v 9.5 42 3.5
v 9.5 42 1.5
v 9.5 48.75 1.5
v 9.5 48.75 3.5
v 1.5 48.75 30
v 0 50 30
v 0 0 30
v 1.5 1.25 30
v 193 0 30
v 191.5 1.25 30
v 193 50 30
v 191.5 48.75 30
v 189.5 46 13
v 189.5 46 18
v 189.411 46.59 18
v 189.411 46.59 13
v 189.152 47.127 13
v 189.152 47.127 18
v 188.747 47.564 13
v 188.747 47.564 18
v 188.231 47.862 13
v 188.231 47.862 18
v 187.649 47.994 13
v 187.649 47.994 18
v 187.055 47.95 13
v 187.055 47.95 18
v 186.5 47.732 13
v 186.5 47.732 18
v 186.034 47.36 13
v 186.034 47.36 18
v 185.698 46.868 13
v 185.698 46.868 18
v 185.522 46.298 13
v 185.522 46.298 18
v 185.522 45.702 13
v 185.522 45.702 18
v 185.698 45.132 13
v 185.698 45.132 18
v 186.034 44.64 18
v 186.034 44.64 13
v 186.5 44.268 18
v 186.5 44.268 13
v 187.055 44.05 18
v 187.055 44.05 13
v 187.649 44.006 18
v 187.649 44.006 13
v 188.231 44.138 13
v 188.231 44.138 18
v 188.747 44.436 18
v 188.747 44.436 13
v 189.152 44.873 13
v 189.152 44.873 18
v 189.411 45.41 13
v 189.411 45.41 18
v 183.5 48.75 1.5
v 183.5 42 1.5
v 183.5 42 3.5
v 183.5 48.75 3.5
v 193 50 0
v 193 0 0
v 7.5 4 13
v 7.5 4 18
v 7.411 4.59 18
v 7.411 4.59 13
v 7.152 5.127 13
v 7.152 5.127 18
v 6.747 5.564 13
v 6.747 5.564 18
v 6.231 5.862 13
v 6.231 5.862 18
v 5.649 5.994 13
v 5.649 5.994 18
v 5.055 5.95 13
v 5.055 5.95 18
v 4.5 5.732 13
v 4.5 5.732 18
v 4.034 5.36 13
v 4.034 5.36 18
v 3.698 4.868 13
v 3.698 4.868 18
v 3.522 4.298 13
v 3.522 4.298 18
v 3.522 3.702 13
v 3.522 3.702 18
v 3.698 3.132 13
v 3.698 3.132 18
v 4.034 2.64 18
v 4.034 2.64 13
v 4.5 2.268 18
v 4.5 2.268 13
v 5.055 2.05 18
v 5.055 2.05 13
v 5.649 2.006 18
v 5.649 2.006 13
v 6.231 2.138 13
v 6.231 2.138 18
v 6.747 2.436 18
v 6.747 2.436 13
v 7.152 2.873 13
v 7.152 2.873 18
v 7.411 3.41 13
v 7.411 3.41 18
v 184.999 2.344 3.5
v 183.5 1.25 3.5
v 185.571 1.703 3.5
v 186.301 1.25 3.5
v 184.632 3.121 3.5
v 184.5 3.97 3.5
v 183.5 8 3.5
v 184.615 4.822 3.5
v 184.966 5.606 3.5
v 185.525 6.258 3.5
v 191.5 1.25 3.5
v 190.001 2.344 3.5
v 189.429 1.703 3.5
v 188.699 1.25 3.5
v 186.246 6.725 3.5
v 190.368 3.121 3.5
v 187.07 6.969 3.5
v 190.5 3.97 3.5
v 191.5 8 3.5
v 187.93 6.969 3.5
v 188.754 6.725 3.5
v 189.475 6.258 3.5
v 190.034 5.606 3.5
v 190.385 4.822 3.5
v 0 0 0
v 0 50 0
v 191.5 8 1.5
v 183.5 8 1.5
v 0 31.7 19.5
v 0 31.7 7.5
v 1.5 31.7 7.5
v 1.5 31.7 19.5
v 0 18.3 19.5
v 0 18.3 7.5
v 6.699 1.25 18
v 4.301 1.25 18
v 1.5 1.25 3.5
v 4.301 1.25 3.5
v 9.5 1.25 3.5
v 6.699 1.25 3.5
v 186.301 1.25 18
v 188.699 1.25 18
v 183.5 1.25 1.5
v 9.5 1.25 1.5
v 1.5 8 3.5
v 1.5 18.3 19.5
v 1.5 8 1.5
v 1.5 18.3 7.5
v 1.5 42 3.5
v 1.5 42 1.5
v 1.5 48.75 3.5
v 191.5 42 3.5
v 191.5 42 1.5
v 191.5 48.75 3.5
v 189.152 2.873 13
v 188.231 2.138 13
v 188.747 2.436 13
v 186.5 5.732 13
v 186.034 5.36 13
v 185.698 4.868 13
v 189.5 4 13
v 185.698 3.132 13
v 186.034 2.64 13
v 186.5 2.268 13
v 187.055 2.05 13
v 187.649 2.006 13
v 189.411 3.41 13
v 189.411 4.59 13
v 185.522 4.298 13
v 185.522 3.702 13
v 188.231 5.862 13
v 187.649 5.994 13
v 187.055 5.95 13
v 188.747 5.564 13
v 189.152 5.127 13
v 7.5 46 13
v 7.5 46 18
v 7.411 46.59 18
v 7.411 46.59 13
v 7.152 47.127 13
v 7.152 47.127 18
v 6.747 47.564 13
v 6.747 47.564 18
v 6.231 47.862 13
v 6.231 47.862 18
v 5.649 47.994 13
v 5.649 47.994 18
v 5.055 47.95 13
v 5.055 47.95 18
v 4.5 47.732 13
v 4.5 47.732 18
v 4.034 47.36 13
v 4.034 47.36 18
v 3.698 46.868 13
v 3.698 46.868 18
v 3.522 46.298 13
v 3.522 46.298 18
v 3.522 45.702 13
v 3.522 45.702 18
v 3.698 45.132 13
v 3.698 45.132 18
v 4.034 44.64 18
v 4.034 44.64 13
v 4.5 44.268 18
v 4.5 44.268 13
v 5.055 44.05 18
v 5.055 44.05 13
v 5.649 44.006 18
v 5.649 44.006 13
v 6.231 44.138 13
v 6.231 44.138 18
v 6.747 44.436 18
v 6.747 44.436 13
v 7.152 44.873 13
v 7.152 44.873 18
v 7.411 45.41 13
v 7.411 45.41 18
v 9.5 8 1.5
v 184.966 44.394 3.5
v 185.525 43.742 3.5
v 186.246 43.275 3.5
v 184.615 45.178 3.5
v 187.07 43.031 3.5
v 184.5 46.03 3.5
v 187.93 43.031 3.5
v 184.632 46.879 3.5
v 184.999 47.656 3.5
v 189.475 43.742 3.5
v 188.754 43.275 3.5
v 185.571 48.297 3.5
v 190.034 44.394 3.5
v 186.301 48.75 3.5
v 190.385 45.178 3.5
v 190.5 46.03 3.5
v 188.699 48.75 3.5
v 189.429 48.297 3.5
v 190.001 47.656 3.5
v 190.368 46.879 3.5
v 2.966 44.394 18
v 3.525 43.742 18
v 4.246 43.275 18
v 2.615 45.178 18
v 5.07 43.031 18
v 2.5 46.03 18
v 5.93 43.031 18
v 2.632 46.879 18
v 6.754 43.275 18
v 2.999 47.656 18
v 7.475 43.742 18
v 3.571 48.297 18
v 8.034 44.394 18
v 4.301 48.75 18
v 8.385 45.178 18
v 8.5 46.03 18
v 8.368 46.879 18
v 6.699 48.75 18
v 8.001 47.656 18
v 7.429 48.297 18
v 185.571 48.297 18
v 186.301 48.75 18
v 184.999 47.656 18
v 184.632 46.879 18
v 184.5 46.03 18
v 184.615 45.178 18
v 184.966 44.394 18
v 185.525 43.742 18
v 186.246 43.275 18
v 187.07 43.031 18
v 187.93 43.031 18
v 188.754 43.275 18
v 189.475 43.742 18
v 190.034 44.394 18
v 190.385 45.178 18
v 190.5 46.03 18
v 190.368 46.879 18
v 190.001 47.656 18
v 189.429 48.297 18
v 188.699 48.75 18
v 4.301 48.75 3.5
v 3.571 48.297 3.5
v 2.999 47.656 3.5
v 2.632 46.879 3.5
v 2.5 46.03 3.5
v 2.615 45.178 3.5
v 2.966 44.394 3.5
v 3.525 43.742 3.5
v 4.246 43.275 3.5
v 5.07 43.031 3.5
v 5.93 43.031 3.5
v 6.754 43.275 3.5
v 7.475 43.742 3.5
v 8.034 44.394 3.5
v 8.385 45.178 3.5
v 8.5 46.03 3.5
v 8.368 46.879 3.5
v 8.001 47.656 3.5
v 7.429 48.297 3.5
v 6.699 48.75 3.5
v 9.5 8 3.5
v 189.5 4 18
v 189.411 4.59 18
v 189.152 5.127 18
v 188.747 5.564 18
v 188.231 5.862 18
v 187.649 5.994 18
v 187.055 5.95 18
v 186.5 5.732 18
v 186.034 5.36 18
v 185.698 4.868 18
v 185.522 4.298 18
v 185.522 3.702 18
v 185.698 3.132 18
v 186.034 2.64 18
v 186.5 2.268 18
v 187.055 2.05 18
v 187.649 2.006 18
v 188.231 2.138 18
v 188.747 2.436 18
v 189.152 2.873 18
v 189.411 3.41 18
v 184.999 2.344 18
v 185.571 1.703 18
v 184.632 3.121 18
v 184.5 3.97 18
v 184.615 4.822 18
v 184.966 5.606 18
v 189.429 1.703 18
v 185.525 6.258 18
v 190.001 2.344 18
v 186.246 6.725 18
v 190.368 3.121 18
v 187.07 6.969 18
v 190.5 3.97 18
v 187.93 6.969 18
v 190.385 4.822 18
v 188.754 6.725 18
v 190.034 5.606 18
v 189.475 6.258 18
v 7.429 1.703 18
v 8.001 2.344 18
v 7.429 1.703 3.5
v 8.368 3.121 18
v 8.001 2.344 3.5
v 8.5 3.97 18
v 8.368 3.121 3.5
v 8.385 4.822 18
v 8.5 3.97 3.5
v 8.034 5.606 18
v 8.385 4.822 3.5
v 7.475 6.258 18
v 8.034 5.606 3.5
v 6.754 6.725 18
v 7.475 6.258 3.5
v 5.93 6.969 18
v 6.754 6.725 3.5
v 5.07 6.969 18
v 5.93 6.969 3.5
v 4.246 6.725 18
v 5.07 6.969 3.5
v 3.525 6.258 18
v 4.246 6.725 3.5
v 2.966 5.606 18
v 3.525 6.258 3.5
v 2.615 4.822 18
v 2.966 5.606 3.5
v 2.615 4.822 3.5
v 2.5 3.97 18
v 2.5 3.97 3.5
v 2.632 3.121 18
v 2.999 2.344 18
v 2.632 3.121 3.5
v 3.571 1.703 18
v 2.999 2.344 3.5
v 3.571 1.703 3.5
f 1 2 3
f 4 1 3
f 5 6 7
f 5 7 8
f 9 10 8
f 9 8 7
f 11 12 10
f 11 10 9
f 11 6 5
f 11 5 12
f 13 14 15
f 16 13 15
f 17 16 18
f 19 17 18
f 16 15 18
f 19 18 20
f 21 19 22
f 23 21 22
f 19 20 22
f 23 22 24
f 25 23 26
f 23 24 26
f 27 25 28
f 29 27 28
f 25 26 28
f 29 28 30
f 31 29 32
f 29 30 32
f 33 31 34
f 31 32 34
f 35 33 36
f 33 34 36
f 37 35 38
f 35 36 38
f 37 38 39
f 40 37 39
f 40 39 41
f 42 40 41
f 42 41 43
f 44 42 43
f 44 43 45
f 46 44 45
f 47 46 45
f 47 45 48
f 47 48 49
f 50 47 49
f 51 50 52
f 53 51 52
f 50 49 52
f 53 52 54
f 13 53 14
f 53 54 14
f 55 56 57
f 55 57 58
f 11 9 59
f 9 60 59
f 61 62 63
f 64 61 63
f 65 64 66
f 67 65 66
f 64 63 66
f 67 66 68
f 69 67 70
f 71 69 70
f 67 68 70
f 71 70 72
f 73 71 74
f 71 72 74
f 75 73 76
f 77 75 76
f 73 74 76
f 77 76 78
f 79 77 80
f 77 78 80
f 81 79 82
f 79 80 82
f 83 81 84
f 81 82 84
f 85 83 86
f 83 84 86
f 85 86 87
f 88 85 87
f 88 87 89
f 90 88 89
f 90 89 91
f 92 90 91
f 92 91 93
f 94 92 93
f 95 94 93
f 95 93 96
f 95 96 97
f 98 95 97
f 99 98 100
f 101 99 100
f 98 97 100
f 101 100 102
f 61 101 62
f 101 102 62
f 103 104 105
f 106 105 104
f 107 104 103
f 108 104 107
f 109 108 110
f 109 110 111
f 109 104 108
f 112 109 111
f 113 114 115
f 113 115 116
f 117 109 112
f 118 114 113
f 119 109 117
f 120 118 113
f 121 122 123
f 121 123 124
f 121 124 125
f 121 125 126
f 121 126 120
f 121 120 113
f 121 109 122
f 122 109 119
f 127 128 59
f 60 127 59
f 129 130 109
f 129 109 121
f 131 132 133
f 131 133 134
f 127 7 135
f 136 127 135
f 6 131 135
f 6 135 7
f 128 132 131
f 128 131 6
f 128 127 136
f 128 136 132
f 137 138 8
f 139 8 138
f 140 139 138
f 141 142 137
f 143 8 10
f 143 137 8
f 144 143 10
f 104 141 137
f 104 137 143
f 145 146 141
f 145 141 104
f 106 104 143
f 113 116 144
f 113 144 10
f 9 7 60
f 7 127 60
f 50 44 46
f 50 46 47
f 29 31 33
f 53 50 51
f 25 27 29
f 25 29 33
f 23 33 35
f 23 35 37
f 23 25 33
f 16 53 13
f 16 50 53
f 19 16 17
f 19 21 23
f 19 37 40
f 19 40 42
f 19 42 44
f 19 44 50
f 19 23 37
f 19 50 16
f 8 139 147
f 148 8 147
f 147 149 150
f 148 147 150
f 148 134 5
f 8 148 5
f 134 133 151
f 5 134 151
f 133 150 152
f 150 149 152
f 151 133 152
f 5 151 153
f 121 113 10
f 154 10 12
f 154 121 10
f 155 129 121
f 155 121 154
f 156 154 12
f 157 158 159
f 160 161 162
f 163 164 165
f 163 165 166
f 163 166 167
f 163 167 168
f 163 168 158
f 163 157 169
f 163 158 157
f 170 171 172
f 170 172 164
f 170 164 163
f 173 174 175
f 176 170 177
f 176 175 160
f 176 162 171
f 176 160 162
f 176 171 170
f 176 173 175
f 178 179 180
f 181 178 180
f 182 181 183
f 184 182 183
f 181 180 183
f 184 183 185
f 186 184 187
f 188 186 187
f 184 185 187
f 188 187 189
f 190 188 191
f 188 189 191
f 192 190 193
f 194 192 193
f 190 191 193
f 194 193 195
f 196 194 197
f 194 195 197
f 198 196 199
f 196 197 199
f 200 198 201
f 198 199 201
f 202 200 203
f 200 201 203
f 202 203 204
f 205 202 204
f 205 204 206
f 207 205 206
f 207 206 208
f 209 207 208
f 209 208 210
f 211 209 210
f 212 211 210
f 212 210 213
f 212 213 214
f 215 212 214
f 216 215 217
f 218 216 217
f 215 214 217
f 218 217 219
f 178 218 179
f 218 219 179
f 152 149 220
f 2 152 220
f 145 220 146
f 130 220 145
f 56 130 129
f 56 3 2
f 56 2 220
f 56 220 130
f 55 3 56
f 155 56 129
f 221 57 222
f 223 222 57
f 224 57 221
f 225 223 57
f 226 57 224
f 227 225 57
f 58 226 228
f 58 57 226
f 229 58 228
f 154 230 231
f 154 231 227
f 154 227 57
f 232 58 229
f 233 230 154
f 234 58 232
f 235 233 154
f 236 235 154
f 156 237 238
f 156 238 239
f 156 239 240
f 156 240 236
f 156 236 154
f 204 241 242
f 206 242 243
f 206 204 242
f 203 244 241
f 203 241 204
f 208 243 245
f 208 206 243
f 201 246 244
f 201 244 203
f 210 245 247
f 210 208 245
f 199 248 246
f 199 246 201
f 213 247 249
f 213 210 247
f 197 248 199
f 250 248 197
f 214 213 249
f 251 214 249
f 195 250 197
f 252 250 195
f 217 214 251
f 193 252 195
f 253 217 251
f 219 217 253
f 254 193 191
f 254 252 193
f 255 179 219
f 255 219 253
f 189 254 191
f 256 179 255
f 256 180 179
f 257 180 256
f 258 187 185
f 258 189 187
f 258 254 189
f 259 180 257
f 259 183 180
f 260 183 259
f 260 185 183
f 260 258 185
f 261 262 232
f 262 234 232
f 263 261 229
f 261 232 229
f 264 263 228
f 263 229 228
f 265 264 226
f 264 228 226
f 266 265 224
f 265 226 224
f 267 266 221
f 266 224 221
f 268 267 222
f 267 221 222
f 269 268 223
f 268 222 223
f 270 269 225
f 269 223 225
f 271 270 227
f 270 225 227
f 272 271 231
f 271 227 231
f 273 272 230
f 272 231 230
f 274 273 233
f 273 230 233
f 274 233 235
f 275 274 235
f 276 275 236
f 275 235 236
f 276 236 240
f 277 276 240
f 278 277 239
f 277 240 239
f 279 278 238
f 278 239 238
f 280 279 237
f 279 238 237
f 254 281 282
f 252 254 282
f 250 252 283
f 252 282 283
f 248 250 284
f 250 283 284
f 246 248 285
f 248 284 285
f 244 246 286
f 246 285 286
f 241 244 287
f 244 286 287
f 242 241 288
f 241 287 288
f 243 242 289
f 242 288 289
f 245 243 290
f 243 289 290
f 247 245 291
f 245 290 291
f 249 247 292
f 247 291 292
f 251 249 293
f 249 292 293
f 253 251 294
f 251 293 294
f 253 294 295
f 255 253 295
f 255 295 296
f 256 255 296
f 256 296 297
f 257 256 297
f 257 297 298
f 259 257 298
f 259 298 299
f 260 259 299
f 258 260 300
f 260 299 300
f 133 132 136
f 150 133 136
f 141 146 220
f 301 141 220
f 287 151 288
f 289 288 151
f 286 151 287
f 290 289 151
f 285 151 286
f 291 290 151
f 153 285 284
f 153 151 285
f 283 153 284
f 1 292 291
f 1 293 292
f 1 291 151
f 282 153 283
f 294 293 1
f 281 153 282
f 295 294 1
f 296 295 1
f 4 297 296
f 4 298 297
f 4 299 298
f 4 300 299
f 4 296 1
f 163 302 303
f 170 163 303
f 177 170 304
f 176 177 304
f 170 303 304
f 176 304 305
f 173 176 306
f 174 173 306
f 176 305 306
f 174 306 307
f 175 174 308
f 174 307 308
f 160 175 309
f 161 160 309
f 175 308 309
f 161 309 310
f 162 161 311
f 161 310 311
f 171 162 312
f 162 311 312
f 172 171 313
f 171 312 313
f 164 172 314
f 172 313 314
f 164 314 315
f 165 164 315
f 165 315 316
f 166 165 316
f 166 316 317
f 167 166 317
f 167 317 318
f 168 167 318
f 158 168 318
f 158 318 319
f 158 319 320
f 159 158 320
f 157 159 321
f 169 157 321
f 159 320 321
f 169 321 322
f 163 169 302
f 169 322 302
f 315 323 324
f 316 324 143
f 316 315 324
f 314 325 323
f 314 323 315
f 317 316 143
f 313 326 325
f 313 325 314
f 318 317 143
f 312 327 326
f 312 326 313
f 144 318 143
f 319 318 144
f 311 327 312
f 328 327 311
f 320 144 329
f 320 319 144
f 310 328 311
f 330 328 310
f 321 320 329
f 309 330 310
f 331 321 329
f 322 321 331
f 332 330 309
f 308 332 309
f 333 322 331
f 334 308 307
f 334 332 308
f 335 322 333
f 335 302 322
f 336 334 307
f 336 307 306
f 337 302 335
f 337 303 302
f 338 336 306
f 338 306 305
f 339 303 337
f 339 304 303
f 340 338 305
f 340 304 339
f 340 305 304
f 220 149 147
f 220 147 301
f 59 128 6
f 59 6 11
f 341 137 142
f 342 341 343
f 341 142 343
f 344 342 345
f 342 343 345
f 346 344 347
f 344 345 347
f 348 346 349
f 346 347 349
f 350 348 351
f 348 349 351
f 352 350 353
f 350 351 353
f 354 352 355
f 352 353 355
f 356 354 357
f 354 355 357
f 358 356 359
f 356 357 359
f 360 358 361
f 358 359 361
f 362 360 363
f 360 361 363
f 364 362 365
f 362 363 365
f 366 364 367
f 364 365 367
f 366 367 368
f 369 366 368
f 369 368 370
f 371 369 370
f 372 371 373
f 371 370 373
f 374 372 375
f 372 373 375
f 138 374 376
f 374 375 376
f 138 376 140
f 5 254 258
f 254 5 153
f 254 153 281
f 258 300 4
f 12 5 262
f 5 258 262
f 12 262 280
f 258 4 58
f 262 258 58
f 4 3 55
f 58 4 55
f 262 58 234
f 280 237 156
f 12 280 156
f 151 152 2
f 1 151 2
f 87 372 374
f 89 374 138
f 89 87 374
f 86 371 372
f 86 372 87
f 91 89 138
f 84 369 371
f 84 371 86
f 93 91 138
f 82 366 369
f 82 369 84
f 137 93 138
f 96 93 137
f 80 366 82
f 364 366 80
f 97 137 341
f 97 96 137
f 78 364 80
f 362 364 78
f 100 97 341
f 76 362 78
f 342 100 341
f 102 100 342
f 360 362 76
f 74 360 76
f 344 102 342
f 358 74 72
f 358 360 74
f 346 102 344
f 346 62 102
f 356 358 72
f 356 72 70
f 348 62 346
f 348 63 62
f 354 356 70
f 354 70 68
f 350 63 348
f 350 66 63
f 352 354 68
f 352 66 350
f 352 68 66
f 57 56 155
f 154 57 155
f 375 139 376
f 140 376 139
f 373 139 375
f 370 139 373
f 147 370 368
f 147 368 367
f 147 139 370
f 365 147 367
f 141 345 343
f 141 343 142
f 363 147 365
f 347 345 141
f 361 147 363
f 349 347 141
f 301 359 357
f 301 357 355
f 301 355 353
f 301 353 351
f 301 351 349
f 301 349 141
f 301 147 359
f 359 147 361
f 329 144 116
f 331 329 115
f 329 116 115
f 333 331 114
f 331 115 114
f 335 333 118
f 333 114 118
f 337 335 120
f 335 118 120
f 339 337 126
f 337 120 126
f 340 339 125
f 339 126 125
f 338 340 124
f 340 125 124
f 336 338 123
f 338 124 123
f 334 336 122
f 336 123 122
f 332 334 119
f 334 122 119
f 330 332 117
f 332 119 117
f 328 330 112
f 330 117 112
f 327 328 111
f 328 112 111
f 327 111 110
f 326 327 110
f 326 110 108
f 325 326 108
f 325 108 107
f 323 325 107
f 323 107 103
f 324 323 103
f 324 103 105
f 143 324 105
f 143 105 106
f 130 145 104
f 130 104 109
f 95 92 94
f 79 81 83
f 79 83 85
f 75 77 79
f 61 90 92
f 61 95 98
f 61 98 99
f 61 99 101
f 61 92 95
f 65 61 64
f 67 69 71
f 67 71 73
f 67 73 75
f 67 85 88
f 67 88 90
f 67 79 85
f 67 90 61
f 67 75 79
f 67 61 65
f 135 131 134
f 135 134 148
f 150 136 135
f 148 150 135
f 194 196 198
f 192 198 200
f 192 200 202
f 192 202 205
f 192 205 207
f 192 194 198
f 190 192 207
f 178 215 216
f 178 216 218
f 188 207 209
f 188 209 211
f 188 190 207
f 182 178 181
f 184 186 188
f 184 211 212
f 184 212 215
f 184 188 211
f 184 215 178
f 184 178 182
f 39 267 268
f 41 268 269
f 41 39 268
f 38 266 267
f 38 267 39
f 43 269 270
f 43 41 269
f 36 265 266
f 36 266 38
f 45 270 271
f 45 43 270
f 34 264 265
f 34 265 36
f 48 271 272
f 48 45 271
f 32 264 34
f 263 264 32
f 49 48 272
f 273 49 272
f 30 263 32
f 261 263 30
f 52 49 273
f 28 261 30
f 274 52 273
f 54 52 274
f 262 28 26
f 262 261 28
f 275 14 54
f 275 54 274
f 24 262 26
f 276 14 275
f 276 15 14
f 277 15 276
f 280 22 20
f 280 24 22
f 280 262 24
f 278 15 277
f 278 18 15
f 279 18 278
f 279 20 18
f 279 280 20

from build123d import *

# Parameters (mm, degrees)
SKETCH_W        = 193
SKETCH_H        = 50
PAD_DEPTH       = 1.5
SKETCH001_W     = 193
SKETCH001_H     = 50
SKETCH001_W_2   = 190
SKETCH001_H_2   = 47.5
PAD001_DEPTH    = 28.5
SKETCH002_W     = 8
SKETCH002_H     = 6.75
PAD002_DEPTH    = 2
SKETCH003_R     = 3
PAD003_DEPTH    = 14.5
SKETCH004_R     = 2
POCKET_DEPTH    = 5
SKETCH005_W     = 13.4
SKETCH005_H     = 12
POCKET001_DEPTH = 5


with BuildPart() as part:
    # Sketch → Pad (new body)
    with BuildSketch(Plane.XY):
        with Locations((96.5, 25)):
            Rectangle(SKETCH_W, SKETCH_H)
    extrude(amount=PAD_DEPTH)

    # Sketch001 (on Face6 of Pad) → Pad001 (join)
    with BuildSketch(Plane.XY.offset(1.5)):
        with Locations((96.5, 25)):
            Rectangle(SKETCH001_W, SKETCH001_H)
        with Locations((96.5, 25)):
            Rectangle(SKETCH001_W_2, SKETCH001_H_2, mode=Mode.SUBTRACT)
    extrude(amount=PAD001_DEPTH)

    # Sketch002 (on Face15 of Pad001) → Pad002 (join)
    with BuildSketch(Plane.XY.offset(1.5)):
        with Locations((5.5, 45.375)):
            Rectangle(SKETCH002_W, SKETCH002_H)
        with Locations((187.5, 45.375)):
            Rectangle(SKETCH002_W, SKETCH002_H)
        with Locations((187.5, 4.625)):
            Rectangle(SKETCH002_W, SKETCH002_H)
        with Locations((5.5, 4.625)):
            Rectangle(SKETCH002_W, SKETCH002_H)
    extrude(amount=PAD002_DEPTH)

    # Sketch003 (on Face19 of Pad002) → Pad003 (join)
    with BuildSketch(Plane.XY.offset(3.5)):
        with Locations((5.5, 46)):
            Circle(SKETCH003_R)
        with Locations((5.5, 4)):
            Circle(SKETCH003_R)
        with Locations((187.5, 46)):
            Circle(SKETCH003_R)
        with Locations((187.5, 4)):
            Circle(SKETCH003_R)
    extrude(amount=PAD003_DEPTH)

    # Sketch004 (on Face24 of Pad003) → Pocket (cut)
    with BuildSketch(Plane.XY.offset(18)):
        with Locations((187.5, 46)):
            Circle(SKETCH004_R)
        with Locations((187.5, 4)):
            Circle(SKETCH004_R)
        with Locations((5.5, 46)):
            Circle(SKETCH004_R)
        with Locations((5.5, 4)):
            Circle(SKETCH004_R)
    extrude(amount=-POCKET_DEPTH, mode=Mode.SUBTRACT)

    # Sketch005 (on Face7 of Pocket) → Pocket001 (cut)
    with BuildSketch(Plane(origin=(0, 0, 0), x_dir=(0, -1, 0), z_dir=(-1, 0, 0))):
        with Locations((-25, 13.5)):
            Rectangle(SKETCH005_W, SKETCH005_H)
    extrude(amount=-POCKET001_DEPTH, mode=Mode.SUBTRACT)


solid = part.part
